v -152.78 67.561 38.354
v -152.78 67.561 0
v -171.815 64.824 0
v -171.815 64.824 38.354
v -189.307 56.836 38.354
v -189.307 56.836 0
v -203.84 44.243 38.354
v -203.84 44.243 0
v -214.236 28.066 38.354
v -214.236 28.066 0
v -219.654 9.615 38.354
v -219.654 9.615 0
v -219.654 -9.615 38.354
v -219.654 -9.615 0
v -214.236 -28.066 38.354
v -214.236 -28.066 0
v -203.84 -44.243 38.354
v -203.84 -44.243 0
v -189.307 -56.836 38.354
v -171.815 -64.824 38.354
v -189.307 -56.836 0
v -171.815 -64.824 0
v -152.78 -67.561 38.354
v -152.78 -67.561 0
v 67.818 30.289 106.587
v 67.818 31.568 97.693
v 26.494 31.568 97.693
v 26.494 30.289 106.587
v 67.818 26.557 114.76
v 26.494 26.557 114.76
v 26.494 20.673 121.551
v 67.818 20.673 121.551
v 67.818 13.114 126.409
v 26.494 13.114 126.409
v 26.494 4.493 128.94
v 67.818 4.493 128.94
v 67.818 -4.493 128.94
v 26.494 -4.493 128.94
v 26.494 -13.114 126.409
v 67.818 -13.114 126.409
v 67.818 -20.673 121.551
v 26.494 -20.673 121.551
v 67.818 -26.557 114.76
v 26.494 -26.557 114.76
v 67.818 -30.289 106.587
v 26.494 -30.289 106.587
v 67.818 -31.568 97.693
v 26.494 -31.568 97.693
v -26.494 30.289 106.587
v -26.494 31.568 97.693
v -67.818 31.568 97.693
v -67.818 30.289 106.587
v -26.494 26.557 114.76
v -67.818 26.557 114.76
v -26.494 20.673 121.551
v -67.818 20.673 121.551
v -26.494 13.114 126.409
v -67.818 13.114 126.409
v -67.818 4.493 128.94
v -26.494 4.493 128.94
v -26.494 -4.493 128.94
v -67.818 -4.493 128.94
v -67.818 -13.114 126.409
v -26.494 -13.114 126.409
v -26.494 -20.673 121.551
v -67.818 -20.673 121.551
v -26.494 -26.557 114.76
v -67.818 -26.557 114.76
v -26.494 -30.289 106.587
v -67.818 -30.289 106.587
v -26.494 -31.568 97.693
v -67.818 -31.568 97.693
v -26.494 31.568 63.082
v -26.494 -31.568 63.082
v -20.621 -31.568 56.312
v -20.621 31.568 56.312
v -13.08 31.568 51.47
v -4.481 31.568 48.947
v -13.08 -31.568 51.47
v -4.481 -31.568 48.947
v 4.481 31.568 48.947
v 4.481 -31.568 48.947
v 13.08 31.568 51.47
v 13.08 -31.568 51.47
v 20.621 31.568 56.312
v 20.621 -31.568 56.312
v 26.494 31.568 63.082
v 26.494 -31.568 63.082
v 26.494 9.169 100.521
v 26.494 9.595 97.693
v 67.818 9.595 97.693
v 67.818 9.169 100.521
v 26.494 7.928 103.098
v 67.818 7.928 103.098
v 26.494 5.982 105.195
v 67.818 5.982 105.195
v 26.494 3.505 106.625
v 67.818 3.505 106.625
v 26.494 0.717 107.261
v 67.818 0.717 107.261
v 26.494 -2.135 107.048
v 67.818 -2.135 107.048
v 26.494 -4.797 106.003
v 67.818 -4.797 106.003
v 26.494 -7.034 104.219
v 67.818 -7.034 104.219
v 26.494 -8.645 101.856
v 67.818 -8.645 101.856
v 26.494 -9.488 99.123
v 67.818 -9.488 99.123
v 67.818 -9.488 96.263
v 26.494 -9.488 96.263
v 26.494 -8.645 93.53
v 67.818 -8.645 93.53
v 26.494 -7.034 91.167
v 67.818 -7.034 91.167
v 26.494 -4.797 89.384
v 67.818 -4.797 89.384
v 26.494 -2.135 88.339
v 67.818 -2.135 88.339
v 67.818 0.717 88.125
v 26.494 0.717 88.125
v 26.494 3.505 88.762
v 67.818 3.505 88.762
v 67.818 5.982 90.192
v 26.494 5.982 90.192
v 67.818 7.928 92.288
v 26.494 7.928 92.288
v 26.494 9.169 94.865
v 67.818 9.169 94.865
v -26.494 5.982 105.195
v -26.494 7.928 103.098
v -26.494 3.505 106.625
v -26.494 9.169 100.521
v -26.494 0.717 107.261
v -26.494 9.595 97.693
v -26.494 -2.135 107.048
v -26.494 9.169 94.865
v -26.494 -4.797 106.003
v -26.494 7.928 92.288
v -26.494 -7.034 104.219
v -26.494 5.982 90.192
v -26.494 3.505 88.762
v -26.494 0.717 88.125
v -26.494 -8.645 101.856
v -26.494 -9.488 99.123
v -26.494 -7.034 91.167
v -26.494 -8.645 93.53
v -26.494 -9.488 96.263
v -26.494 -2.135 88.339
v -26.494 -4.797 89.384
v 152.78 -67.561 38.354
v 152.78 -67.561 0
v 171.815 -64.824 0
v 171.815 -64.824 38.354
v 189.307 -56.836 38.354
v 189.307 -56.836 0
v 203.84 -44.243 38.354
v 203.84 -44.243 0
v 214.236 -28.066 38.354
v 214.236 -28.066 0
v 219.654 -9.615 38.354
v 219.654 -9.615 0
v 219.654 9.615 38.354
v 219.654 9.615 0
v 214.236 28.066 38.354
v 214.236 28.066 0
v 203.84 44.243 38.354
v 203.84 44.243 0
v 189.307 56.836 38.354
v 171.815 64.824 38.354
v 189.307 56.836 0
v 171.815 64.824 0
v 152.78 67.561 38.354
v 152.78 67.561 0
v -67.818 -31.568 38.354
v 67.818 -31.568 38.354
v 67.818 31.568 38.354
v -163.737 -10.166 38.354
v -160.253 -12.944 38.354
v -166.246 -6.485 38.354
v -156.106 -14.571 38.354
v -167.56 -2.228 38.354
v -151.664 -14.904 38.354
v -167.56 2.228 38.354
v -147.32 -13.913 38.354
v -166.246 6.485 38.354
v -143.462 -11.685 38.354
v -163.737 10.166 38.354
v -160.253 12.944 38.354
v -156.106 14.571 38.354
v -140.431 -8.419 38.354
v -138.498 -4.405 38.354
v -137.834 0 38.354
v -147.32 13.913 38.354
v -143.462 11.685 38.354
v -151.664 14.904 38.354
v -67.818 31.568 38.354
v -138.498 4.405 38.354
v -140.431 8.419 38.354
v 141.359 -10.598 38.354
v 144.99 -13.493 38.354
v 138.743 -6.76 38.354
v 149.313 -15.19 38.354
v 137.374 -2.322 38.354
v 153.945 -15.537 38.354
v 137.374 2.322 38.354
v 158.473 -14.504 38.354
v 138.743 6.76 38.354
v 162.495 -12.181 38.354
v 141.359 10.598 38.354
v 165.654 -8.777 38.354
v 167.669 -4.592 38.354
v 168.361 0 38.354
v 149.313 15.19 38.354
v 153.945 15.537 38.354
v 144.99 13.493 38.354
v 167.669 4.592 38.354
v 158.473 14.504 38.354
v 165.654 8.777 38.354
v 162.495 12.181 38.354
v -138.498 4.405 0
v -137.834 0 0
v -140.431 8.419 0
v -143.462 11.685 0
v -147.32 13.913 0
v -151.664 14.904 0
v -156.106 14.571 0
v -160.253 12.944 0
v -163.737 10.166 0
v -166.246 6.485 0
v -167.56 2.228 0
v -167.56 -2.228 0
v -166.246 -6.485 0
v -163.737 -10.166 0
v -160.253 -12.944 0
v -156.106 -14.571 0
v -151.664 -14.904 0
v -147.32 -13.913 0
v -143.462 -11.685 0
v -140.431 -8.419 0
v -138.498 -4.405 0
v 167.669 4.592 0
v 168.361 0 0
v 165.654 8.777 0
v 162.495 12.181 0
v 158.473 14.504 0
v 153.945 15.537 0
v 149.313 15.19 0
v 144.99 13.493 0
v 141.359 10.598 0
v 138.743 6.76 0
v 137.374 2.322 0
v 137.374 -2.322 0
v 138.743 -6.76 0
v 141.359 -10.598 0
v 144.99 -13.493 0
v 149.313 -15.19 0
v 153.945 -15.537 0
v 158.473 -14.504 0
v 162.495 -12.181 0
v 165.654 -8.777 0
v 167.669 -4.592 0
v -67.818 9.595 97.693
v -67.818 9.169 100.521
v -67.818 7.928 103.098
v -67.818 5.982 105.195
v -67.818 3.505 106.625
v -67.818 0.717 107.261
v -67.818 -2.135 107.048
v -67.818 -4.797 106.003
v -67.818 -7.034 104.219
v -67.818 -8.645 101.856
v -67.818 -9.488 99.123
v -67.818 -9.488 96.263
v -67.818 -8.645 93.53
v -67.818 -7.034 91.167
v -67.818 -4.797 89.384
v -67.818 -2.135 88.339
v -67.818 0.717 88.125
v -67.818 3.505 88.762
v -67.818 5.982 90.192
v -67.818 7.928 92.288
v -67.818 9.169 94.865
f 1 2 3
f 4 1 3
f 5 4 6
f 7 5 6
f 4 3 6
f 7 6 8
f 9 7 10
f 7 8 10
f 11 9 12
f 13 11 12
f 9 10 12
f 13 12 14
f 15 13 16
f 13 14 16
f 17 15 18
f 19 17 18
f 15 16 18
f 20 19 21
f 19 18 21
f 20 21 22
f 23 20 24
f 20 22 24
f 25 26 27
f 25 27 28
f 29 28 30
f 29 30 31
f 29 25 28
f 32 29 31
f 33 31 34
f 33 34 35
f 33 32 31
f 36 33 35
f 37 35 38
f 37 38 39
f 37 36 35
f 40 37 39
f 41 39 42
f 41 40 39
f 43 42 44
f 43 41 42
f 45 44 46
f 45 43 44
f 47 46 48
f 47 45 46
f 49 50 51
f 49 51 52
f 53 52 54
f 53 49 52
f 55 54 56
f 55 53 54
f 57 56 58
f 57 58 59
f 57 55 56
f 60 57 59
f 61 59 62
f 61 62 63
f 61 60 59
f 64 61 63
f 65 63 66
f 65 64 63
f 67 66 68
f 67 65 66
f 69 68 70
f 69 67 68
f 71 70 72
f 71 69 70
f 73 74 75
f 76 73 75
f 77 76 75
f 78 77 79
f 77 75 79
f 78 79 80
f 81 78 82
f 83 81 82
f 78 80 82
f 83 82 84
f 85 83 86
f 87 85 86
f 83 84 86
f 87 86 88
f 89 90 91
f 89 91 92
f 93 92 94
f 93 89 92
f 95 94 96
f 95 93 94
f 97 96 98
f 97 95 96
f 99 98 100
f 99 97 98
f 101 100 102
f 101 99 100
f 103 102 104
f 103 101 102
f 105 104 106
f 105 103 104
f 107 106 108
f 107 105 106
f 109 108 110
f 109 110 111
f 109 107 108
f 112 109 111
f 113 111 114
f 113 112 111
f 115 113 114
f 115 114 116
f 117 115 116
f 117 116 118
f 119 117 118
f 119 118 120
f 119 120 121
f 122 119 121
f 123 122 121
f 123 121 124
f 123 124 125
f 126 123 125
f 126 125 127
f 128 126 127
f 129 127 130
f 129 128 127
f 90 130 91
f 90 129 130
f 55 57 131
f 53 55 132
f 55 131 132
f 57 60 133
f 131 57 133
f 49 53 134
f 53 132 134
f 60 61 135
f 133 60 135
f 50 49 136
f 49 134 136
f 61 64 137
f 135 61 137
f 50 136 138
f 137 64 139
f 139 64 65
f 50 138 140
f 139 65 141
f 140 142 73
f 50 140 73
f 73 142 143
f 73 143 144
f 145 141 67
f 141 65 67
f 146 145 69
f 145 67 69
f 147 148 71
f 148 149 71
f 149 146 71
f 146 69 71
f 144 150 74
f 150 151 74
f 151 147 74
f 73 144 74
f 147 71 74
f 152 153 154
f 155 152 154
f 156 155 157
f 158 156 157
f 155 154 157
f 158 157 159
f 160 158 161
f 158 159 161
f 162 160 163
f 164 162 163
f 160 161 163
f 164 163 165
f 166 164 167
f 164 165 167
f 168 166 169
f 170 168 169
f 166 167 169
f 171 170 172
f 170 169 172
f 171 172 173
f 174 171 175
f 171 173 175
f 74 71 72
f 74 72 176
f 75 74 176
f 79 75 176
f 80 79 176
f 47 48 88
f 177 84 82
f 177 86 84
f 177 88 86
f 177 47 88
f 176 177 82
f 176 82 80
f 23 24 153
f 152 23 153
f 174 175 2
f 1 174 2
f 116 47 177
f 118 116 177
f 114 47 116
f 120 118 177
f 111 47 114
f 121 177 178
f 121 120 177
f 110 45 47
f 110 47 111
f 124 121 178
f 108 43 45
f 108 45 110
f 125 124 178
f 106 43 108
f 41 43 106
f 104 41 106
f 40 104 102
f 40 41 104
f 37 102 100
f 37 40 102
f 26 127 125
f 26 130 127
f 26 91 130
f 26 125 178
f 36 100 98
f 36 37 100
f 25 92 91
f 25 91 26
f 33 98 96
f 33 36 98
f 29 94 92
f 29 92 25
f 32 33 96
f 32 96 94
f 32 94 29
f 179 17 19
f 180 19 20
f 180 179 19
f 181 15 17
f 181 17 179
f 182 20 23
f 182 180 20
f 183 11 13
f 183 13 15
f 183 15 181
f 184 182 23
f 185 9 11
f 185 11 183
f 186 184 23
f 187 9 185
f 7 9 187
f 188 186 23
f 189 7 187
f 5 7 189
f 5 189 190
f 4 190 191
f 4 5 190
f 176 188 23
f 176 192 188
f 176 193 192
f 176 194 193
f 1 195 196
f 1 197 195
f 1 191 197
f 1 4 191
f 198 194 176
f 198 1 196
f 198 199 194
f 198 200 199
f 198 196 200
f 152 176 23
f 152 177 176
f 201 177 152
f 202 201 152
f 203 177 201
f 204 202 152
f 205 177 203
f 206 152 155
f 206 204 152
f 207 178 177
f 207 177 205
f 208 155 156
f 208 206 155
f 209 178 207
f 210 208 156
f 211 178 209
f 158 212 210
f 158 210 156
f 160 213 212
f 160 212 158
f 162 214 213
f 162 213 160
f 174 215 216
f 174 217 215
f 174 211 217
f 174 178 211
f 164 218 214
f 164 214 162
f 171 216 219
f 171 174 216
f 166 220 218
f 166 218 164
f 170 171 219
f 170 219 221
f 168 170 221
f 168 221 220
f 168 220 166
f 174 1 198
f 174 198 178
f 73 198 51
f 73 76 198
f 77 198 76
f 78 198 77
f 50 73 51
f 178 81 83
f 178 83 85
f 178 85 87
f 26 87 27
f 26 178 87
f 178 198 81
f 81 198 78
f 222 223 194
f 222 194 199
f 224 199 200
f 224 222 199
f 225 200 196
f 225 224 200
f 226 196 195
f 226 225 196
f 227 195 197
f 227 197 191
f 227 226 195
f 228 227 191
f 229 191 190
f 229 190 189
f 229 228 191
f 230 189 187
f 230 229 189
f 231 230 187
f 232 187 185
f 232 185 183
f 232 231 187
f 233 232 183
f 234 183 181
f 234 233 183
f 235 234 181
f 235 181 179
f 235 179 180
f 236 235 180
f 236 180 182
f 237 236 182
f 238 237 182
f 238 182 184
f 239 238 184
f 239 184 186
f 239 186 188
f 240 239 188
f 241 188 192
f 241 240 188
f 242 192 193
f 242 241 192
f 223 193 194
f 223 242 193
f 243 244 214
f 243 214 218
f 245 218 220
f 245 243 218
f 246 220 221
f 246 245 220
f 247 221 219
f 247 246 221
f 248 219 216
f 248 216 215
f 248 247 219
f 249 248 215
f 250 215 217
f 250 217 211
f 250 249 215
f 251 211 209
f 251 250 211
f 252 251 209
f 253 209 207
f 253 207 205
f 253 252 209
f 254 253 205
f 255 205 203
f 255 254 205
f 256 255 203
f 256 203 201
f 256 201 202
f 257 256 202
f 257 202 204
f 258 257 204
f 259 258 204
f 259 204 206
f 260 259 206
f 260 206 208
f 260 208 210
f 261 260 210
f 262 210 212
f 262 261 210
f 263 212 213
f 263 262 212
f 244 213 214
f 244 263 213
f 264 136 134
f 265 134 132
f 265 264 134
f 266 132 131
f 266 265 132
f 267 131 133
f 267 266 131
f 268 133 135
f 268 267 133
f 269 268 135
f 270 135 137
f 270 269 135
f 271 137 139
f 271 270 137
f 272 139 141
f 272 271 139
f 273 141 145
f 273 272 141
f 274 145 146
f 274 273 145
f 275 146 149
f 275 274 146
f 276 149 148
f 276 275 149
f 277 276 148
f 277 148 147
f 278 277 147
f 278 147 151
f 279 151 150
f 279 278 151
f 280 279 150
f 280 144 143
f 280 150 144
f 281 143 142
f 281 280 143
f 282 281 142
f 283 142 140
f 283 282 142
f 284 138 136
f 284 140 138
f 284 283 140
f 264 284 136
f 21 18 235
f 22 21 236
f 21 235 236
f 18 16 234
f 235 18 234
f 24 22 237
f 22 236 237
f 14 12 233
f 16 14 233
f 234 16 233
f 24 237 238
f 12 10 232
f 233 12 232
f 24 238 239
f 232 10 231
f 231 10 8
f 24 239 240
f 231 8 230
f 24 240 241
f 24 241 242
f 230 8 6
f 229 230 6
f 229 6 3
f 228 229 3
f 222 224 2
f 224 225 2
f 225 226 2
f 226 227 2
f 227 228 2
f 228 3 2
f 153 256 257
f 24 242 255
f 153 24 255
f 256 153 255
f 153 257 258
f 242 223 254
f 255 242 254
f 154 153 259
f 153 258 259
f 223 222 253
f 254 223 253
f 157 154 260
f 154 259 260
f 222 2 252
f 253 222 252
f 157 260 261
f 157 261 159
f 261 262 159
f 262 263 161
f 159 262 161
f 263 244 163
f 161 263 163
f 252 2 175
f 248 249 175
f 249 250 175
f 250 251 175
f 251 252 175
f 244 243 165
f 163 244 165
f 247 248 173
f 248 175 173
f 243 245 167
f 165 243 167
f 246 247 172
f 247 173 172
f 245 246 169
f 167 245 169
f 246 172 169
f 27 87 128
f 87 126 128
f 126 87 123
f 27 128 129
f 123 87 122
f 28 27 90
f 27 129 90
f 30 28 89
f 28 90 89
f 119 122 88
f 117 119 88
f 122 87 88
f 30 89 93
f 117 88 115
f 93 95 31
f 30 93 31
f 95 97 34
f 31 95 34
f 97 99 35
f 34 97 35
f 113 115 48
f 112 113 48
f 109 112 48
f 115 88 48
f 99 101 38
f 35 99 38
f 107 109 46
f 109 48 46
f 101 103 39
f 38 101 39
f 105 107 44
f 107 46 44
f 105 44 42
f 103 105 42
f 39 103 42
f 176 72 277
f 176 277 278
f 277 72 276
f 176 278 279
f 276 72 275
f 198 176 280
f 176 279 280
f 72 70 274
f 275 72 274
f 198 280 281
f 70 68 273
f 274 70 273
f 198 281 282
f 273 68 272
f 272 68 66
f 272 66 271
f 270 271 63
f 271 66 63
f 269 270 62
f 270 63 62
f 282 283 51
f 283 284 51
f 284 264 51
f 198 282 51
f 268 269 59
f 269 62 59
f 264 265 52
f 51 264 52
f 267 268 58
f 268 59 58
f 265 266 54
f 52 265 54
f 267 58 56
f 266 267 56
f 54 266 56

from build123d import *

# Parameters (mm, degrees)
F0_R     = 14.946104
F0_R_2   = 15.580655
F1_DEPTH = 38.354
F2_R     = 9.594843
F3_DEPTH = 67.818
F5_DEPTH = 58.928


with BuildPart() as f1:
    # F0 (on Top) → F1 (new body)
    with BuildSketch(Plane.XY):
        with BuildLine():
            ThreePointArc((152.780443, -67.56109), (220.341533, 0), (152.780443, 67.56109))
            Line((152.780443, 67.56109), (-152.780443, 67.56109))
            ThreePointArc((-152.780443, 67.56109), (-220.341533, 0), (-152.780443, -67.56109))
            Line((-152.780443, -67.56109), (152.780443, -67.56109))
        make_face()
        with Locations((-152.780443, 0)):
            Circle(F0_R, mode=Mode.SUBTRACT)
        with Locations((152.780443, 0)):
            Circle(F0_R_2, mode=Mode.SUBTRACT)
    extrude(amount=F1_DEPTH)

    # F2 (on Right) → F3 (join, symmetric)
    with BuildSketch(Plane.YZ):
        with BuildLine():
            ThreePointArc((31.568192, 97.693309), (0, 129.261501), (-31.568192, 97.693309))
            Line((-31.568192, 97.693309), (-31.568192, 38.354))
            Line((-31.568192, 38.354), (31.568192, 38.354))
            Line((31.568192, 38.354), (31.568192, 97.693309))
        make_face()
        with Locations((0, 97.693309)):
            Circle(F2_R, mode=Mode.SUBTRACT)
    extrude(amount=F3_DEPTH, both=True)

    # F4 (on Front) → F5 (cut, symmetric)
    with BuildSketch(Plane.XZ):
        with BuildLine():
            Line((26.493635, 63.081741), (26.493635, 133.099258))
            Line((26.493635, 133.099258), (-26.493635, 133.099258))
            Line((-26.493635, 133.099258), (-26.493635, 63.081741))
            ThreePointArc((-26.493635, 63.081741), (0, 48.626888), (26.493635, 63.081741))
        make_face()
    extrude(amount=F5_DEPTH, both=True, mode=Mode.SUBTRACT)


solid = f1.part
